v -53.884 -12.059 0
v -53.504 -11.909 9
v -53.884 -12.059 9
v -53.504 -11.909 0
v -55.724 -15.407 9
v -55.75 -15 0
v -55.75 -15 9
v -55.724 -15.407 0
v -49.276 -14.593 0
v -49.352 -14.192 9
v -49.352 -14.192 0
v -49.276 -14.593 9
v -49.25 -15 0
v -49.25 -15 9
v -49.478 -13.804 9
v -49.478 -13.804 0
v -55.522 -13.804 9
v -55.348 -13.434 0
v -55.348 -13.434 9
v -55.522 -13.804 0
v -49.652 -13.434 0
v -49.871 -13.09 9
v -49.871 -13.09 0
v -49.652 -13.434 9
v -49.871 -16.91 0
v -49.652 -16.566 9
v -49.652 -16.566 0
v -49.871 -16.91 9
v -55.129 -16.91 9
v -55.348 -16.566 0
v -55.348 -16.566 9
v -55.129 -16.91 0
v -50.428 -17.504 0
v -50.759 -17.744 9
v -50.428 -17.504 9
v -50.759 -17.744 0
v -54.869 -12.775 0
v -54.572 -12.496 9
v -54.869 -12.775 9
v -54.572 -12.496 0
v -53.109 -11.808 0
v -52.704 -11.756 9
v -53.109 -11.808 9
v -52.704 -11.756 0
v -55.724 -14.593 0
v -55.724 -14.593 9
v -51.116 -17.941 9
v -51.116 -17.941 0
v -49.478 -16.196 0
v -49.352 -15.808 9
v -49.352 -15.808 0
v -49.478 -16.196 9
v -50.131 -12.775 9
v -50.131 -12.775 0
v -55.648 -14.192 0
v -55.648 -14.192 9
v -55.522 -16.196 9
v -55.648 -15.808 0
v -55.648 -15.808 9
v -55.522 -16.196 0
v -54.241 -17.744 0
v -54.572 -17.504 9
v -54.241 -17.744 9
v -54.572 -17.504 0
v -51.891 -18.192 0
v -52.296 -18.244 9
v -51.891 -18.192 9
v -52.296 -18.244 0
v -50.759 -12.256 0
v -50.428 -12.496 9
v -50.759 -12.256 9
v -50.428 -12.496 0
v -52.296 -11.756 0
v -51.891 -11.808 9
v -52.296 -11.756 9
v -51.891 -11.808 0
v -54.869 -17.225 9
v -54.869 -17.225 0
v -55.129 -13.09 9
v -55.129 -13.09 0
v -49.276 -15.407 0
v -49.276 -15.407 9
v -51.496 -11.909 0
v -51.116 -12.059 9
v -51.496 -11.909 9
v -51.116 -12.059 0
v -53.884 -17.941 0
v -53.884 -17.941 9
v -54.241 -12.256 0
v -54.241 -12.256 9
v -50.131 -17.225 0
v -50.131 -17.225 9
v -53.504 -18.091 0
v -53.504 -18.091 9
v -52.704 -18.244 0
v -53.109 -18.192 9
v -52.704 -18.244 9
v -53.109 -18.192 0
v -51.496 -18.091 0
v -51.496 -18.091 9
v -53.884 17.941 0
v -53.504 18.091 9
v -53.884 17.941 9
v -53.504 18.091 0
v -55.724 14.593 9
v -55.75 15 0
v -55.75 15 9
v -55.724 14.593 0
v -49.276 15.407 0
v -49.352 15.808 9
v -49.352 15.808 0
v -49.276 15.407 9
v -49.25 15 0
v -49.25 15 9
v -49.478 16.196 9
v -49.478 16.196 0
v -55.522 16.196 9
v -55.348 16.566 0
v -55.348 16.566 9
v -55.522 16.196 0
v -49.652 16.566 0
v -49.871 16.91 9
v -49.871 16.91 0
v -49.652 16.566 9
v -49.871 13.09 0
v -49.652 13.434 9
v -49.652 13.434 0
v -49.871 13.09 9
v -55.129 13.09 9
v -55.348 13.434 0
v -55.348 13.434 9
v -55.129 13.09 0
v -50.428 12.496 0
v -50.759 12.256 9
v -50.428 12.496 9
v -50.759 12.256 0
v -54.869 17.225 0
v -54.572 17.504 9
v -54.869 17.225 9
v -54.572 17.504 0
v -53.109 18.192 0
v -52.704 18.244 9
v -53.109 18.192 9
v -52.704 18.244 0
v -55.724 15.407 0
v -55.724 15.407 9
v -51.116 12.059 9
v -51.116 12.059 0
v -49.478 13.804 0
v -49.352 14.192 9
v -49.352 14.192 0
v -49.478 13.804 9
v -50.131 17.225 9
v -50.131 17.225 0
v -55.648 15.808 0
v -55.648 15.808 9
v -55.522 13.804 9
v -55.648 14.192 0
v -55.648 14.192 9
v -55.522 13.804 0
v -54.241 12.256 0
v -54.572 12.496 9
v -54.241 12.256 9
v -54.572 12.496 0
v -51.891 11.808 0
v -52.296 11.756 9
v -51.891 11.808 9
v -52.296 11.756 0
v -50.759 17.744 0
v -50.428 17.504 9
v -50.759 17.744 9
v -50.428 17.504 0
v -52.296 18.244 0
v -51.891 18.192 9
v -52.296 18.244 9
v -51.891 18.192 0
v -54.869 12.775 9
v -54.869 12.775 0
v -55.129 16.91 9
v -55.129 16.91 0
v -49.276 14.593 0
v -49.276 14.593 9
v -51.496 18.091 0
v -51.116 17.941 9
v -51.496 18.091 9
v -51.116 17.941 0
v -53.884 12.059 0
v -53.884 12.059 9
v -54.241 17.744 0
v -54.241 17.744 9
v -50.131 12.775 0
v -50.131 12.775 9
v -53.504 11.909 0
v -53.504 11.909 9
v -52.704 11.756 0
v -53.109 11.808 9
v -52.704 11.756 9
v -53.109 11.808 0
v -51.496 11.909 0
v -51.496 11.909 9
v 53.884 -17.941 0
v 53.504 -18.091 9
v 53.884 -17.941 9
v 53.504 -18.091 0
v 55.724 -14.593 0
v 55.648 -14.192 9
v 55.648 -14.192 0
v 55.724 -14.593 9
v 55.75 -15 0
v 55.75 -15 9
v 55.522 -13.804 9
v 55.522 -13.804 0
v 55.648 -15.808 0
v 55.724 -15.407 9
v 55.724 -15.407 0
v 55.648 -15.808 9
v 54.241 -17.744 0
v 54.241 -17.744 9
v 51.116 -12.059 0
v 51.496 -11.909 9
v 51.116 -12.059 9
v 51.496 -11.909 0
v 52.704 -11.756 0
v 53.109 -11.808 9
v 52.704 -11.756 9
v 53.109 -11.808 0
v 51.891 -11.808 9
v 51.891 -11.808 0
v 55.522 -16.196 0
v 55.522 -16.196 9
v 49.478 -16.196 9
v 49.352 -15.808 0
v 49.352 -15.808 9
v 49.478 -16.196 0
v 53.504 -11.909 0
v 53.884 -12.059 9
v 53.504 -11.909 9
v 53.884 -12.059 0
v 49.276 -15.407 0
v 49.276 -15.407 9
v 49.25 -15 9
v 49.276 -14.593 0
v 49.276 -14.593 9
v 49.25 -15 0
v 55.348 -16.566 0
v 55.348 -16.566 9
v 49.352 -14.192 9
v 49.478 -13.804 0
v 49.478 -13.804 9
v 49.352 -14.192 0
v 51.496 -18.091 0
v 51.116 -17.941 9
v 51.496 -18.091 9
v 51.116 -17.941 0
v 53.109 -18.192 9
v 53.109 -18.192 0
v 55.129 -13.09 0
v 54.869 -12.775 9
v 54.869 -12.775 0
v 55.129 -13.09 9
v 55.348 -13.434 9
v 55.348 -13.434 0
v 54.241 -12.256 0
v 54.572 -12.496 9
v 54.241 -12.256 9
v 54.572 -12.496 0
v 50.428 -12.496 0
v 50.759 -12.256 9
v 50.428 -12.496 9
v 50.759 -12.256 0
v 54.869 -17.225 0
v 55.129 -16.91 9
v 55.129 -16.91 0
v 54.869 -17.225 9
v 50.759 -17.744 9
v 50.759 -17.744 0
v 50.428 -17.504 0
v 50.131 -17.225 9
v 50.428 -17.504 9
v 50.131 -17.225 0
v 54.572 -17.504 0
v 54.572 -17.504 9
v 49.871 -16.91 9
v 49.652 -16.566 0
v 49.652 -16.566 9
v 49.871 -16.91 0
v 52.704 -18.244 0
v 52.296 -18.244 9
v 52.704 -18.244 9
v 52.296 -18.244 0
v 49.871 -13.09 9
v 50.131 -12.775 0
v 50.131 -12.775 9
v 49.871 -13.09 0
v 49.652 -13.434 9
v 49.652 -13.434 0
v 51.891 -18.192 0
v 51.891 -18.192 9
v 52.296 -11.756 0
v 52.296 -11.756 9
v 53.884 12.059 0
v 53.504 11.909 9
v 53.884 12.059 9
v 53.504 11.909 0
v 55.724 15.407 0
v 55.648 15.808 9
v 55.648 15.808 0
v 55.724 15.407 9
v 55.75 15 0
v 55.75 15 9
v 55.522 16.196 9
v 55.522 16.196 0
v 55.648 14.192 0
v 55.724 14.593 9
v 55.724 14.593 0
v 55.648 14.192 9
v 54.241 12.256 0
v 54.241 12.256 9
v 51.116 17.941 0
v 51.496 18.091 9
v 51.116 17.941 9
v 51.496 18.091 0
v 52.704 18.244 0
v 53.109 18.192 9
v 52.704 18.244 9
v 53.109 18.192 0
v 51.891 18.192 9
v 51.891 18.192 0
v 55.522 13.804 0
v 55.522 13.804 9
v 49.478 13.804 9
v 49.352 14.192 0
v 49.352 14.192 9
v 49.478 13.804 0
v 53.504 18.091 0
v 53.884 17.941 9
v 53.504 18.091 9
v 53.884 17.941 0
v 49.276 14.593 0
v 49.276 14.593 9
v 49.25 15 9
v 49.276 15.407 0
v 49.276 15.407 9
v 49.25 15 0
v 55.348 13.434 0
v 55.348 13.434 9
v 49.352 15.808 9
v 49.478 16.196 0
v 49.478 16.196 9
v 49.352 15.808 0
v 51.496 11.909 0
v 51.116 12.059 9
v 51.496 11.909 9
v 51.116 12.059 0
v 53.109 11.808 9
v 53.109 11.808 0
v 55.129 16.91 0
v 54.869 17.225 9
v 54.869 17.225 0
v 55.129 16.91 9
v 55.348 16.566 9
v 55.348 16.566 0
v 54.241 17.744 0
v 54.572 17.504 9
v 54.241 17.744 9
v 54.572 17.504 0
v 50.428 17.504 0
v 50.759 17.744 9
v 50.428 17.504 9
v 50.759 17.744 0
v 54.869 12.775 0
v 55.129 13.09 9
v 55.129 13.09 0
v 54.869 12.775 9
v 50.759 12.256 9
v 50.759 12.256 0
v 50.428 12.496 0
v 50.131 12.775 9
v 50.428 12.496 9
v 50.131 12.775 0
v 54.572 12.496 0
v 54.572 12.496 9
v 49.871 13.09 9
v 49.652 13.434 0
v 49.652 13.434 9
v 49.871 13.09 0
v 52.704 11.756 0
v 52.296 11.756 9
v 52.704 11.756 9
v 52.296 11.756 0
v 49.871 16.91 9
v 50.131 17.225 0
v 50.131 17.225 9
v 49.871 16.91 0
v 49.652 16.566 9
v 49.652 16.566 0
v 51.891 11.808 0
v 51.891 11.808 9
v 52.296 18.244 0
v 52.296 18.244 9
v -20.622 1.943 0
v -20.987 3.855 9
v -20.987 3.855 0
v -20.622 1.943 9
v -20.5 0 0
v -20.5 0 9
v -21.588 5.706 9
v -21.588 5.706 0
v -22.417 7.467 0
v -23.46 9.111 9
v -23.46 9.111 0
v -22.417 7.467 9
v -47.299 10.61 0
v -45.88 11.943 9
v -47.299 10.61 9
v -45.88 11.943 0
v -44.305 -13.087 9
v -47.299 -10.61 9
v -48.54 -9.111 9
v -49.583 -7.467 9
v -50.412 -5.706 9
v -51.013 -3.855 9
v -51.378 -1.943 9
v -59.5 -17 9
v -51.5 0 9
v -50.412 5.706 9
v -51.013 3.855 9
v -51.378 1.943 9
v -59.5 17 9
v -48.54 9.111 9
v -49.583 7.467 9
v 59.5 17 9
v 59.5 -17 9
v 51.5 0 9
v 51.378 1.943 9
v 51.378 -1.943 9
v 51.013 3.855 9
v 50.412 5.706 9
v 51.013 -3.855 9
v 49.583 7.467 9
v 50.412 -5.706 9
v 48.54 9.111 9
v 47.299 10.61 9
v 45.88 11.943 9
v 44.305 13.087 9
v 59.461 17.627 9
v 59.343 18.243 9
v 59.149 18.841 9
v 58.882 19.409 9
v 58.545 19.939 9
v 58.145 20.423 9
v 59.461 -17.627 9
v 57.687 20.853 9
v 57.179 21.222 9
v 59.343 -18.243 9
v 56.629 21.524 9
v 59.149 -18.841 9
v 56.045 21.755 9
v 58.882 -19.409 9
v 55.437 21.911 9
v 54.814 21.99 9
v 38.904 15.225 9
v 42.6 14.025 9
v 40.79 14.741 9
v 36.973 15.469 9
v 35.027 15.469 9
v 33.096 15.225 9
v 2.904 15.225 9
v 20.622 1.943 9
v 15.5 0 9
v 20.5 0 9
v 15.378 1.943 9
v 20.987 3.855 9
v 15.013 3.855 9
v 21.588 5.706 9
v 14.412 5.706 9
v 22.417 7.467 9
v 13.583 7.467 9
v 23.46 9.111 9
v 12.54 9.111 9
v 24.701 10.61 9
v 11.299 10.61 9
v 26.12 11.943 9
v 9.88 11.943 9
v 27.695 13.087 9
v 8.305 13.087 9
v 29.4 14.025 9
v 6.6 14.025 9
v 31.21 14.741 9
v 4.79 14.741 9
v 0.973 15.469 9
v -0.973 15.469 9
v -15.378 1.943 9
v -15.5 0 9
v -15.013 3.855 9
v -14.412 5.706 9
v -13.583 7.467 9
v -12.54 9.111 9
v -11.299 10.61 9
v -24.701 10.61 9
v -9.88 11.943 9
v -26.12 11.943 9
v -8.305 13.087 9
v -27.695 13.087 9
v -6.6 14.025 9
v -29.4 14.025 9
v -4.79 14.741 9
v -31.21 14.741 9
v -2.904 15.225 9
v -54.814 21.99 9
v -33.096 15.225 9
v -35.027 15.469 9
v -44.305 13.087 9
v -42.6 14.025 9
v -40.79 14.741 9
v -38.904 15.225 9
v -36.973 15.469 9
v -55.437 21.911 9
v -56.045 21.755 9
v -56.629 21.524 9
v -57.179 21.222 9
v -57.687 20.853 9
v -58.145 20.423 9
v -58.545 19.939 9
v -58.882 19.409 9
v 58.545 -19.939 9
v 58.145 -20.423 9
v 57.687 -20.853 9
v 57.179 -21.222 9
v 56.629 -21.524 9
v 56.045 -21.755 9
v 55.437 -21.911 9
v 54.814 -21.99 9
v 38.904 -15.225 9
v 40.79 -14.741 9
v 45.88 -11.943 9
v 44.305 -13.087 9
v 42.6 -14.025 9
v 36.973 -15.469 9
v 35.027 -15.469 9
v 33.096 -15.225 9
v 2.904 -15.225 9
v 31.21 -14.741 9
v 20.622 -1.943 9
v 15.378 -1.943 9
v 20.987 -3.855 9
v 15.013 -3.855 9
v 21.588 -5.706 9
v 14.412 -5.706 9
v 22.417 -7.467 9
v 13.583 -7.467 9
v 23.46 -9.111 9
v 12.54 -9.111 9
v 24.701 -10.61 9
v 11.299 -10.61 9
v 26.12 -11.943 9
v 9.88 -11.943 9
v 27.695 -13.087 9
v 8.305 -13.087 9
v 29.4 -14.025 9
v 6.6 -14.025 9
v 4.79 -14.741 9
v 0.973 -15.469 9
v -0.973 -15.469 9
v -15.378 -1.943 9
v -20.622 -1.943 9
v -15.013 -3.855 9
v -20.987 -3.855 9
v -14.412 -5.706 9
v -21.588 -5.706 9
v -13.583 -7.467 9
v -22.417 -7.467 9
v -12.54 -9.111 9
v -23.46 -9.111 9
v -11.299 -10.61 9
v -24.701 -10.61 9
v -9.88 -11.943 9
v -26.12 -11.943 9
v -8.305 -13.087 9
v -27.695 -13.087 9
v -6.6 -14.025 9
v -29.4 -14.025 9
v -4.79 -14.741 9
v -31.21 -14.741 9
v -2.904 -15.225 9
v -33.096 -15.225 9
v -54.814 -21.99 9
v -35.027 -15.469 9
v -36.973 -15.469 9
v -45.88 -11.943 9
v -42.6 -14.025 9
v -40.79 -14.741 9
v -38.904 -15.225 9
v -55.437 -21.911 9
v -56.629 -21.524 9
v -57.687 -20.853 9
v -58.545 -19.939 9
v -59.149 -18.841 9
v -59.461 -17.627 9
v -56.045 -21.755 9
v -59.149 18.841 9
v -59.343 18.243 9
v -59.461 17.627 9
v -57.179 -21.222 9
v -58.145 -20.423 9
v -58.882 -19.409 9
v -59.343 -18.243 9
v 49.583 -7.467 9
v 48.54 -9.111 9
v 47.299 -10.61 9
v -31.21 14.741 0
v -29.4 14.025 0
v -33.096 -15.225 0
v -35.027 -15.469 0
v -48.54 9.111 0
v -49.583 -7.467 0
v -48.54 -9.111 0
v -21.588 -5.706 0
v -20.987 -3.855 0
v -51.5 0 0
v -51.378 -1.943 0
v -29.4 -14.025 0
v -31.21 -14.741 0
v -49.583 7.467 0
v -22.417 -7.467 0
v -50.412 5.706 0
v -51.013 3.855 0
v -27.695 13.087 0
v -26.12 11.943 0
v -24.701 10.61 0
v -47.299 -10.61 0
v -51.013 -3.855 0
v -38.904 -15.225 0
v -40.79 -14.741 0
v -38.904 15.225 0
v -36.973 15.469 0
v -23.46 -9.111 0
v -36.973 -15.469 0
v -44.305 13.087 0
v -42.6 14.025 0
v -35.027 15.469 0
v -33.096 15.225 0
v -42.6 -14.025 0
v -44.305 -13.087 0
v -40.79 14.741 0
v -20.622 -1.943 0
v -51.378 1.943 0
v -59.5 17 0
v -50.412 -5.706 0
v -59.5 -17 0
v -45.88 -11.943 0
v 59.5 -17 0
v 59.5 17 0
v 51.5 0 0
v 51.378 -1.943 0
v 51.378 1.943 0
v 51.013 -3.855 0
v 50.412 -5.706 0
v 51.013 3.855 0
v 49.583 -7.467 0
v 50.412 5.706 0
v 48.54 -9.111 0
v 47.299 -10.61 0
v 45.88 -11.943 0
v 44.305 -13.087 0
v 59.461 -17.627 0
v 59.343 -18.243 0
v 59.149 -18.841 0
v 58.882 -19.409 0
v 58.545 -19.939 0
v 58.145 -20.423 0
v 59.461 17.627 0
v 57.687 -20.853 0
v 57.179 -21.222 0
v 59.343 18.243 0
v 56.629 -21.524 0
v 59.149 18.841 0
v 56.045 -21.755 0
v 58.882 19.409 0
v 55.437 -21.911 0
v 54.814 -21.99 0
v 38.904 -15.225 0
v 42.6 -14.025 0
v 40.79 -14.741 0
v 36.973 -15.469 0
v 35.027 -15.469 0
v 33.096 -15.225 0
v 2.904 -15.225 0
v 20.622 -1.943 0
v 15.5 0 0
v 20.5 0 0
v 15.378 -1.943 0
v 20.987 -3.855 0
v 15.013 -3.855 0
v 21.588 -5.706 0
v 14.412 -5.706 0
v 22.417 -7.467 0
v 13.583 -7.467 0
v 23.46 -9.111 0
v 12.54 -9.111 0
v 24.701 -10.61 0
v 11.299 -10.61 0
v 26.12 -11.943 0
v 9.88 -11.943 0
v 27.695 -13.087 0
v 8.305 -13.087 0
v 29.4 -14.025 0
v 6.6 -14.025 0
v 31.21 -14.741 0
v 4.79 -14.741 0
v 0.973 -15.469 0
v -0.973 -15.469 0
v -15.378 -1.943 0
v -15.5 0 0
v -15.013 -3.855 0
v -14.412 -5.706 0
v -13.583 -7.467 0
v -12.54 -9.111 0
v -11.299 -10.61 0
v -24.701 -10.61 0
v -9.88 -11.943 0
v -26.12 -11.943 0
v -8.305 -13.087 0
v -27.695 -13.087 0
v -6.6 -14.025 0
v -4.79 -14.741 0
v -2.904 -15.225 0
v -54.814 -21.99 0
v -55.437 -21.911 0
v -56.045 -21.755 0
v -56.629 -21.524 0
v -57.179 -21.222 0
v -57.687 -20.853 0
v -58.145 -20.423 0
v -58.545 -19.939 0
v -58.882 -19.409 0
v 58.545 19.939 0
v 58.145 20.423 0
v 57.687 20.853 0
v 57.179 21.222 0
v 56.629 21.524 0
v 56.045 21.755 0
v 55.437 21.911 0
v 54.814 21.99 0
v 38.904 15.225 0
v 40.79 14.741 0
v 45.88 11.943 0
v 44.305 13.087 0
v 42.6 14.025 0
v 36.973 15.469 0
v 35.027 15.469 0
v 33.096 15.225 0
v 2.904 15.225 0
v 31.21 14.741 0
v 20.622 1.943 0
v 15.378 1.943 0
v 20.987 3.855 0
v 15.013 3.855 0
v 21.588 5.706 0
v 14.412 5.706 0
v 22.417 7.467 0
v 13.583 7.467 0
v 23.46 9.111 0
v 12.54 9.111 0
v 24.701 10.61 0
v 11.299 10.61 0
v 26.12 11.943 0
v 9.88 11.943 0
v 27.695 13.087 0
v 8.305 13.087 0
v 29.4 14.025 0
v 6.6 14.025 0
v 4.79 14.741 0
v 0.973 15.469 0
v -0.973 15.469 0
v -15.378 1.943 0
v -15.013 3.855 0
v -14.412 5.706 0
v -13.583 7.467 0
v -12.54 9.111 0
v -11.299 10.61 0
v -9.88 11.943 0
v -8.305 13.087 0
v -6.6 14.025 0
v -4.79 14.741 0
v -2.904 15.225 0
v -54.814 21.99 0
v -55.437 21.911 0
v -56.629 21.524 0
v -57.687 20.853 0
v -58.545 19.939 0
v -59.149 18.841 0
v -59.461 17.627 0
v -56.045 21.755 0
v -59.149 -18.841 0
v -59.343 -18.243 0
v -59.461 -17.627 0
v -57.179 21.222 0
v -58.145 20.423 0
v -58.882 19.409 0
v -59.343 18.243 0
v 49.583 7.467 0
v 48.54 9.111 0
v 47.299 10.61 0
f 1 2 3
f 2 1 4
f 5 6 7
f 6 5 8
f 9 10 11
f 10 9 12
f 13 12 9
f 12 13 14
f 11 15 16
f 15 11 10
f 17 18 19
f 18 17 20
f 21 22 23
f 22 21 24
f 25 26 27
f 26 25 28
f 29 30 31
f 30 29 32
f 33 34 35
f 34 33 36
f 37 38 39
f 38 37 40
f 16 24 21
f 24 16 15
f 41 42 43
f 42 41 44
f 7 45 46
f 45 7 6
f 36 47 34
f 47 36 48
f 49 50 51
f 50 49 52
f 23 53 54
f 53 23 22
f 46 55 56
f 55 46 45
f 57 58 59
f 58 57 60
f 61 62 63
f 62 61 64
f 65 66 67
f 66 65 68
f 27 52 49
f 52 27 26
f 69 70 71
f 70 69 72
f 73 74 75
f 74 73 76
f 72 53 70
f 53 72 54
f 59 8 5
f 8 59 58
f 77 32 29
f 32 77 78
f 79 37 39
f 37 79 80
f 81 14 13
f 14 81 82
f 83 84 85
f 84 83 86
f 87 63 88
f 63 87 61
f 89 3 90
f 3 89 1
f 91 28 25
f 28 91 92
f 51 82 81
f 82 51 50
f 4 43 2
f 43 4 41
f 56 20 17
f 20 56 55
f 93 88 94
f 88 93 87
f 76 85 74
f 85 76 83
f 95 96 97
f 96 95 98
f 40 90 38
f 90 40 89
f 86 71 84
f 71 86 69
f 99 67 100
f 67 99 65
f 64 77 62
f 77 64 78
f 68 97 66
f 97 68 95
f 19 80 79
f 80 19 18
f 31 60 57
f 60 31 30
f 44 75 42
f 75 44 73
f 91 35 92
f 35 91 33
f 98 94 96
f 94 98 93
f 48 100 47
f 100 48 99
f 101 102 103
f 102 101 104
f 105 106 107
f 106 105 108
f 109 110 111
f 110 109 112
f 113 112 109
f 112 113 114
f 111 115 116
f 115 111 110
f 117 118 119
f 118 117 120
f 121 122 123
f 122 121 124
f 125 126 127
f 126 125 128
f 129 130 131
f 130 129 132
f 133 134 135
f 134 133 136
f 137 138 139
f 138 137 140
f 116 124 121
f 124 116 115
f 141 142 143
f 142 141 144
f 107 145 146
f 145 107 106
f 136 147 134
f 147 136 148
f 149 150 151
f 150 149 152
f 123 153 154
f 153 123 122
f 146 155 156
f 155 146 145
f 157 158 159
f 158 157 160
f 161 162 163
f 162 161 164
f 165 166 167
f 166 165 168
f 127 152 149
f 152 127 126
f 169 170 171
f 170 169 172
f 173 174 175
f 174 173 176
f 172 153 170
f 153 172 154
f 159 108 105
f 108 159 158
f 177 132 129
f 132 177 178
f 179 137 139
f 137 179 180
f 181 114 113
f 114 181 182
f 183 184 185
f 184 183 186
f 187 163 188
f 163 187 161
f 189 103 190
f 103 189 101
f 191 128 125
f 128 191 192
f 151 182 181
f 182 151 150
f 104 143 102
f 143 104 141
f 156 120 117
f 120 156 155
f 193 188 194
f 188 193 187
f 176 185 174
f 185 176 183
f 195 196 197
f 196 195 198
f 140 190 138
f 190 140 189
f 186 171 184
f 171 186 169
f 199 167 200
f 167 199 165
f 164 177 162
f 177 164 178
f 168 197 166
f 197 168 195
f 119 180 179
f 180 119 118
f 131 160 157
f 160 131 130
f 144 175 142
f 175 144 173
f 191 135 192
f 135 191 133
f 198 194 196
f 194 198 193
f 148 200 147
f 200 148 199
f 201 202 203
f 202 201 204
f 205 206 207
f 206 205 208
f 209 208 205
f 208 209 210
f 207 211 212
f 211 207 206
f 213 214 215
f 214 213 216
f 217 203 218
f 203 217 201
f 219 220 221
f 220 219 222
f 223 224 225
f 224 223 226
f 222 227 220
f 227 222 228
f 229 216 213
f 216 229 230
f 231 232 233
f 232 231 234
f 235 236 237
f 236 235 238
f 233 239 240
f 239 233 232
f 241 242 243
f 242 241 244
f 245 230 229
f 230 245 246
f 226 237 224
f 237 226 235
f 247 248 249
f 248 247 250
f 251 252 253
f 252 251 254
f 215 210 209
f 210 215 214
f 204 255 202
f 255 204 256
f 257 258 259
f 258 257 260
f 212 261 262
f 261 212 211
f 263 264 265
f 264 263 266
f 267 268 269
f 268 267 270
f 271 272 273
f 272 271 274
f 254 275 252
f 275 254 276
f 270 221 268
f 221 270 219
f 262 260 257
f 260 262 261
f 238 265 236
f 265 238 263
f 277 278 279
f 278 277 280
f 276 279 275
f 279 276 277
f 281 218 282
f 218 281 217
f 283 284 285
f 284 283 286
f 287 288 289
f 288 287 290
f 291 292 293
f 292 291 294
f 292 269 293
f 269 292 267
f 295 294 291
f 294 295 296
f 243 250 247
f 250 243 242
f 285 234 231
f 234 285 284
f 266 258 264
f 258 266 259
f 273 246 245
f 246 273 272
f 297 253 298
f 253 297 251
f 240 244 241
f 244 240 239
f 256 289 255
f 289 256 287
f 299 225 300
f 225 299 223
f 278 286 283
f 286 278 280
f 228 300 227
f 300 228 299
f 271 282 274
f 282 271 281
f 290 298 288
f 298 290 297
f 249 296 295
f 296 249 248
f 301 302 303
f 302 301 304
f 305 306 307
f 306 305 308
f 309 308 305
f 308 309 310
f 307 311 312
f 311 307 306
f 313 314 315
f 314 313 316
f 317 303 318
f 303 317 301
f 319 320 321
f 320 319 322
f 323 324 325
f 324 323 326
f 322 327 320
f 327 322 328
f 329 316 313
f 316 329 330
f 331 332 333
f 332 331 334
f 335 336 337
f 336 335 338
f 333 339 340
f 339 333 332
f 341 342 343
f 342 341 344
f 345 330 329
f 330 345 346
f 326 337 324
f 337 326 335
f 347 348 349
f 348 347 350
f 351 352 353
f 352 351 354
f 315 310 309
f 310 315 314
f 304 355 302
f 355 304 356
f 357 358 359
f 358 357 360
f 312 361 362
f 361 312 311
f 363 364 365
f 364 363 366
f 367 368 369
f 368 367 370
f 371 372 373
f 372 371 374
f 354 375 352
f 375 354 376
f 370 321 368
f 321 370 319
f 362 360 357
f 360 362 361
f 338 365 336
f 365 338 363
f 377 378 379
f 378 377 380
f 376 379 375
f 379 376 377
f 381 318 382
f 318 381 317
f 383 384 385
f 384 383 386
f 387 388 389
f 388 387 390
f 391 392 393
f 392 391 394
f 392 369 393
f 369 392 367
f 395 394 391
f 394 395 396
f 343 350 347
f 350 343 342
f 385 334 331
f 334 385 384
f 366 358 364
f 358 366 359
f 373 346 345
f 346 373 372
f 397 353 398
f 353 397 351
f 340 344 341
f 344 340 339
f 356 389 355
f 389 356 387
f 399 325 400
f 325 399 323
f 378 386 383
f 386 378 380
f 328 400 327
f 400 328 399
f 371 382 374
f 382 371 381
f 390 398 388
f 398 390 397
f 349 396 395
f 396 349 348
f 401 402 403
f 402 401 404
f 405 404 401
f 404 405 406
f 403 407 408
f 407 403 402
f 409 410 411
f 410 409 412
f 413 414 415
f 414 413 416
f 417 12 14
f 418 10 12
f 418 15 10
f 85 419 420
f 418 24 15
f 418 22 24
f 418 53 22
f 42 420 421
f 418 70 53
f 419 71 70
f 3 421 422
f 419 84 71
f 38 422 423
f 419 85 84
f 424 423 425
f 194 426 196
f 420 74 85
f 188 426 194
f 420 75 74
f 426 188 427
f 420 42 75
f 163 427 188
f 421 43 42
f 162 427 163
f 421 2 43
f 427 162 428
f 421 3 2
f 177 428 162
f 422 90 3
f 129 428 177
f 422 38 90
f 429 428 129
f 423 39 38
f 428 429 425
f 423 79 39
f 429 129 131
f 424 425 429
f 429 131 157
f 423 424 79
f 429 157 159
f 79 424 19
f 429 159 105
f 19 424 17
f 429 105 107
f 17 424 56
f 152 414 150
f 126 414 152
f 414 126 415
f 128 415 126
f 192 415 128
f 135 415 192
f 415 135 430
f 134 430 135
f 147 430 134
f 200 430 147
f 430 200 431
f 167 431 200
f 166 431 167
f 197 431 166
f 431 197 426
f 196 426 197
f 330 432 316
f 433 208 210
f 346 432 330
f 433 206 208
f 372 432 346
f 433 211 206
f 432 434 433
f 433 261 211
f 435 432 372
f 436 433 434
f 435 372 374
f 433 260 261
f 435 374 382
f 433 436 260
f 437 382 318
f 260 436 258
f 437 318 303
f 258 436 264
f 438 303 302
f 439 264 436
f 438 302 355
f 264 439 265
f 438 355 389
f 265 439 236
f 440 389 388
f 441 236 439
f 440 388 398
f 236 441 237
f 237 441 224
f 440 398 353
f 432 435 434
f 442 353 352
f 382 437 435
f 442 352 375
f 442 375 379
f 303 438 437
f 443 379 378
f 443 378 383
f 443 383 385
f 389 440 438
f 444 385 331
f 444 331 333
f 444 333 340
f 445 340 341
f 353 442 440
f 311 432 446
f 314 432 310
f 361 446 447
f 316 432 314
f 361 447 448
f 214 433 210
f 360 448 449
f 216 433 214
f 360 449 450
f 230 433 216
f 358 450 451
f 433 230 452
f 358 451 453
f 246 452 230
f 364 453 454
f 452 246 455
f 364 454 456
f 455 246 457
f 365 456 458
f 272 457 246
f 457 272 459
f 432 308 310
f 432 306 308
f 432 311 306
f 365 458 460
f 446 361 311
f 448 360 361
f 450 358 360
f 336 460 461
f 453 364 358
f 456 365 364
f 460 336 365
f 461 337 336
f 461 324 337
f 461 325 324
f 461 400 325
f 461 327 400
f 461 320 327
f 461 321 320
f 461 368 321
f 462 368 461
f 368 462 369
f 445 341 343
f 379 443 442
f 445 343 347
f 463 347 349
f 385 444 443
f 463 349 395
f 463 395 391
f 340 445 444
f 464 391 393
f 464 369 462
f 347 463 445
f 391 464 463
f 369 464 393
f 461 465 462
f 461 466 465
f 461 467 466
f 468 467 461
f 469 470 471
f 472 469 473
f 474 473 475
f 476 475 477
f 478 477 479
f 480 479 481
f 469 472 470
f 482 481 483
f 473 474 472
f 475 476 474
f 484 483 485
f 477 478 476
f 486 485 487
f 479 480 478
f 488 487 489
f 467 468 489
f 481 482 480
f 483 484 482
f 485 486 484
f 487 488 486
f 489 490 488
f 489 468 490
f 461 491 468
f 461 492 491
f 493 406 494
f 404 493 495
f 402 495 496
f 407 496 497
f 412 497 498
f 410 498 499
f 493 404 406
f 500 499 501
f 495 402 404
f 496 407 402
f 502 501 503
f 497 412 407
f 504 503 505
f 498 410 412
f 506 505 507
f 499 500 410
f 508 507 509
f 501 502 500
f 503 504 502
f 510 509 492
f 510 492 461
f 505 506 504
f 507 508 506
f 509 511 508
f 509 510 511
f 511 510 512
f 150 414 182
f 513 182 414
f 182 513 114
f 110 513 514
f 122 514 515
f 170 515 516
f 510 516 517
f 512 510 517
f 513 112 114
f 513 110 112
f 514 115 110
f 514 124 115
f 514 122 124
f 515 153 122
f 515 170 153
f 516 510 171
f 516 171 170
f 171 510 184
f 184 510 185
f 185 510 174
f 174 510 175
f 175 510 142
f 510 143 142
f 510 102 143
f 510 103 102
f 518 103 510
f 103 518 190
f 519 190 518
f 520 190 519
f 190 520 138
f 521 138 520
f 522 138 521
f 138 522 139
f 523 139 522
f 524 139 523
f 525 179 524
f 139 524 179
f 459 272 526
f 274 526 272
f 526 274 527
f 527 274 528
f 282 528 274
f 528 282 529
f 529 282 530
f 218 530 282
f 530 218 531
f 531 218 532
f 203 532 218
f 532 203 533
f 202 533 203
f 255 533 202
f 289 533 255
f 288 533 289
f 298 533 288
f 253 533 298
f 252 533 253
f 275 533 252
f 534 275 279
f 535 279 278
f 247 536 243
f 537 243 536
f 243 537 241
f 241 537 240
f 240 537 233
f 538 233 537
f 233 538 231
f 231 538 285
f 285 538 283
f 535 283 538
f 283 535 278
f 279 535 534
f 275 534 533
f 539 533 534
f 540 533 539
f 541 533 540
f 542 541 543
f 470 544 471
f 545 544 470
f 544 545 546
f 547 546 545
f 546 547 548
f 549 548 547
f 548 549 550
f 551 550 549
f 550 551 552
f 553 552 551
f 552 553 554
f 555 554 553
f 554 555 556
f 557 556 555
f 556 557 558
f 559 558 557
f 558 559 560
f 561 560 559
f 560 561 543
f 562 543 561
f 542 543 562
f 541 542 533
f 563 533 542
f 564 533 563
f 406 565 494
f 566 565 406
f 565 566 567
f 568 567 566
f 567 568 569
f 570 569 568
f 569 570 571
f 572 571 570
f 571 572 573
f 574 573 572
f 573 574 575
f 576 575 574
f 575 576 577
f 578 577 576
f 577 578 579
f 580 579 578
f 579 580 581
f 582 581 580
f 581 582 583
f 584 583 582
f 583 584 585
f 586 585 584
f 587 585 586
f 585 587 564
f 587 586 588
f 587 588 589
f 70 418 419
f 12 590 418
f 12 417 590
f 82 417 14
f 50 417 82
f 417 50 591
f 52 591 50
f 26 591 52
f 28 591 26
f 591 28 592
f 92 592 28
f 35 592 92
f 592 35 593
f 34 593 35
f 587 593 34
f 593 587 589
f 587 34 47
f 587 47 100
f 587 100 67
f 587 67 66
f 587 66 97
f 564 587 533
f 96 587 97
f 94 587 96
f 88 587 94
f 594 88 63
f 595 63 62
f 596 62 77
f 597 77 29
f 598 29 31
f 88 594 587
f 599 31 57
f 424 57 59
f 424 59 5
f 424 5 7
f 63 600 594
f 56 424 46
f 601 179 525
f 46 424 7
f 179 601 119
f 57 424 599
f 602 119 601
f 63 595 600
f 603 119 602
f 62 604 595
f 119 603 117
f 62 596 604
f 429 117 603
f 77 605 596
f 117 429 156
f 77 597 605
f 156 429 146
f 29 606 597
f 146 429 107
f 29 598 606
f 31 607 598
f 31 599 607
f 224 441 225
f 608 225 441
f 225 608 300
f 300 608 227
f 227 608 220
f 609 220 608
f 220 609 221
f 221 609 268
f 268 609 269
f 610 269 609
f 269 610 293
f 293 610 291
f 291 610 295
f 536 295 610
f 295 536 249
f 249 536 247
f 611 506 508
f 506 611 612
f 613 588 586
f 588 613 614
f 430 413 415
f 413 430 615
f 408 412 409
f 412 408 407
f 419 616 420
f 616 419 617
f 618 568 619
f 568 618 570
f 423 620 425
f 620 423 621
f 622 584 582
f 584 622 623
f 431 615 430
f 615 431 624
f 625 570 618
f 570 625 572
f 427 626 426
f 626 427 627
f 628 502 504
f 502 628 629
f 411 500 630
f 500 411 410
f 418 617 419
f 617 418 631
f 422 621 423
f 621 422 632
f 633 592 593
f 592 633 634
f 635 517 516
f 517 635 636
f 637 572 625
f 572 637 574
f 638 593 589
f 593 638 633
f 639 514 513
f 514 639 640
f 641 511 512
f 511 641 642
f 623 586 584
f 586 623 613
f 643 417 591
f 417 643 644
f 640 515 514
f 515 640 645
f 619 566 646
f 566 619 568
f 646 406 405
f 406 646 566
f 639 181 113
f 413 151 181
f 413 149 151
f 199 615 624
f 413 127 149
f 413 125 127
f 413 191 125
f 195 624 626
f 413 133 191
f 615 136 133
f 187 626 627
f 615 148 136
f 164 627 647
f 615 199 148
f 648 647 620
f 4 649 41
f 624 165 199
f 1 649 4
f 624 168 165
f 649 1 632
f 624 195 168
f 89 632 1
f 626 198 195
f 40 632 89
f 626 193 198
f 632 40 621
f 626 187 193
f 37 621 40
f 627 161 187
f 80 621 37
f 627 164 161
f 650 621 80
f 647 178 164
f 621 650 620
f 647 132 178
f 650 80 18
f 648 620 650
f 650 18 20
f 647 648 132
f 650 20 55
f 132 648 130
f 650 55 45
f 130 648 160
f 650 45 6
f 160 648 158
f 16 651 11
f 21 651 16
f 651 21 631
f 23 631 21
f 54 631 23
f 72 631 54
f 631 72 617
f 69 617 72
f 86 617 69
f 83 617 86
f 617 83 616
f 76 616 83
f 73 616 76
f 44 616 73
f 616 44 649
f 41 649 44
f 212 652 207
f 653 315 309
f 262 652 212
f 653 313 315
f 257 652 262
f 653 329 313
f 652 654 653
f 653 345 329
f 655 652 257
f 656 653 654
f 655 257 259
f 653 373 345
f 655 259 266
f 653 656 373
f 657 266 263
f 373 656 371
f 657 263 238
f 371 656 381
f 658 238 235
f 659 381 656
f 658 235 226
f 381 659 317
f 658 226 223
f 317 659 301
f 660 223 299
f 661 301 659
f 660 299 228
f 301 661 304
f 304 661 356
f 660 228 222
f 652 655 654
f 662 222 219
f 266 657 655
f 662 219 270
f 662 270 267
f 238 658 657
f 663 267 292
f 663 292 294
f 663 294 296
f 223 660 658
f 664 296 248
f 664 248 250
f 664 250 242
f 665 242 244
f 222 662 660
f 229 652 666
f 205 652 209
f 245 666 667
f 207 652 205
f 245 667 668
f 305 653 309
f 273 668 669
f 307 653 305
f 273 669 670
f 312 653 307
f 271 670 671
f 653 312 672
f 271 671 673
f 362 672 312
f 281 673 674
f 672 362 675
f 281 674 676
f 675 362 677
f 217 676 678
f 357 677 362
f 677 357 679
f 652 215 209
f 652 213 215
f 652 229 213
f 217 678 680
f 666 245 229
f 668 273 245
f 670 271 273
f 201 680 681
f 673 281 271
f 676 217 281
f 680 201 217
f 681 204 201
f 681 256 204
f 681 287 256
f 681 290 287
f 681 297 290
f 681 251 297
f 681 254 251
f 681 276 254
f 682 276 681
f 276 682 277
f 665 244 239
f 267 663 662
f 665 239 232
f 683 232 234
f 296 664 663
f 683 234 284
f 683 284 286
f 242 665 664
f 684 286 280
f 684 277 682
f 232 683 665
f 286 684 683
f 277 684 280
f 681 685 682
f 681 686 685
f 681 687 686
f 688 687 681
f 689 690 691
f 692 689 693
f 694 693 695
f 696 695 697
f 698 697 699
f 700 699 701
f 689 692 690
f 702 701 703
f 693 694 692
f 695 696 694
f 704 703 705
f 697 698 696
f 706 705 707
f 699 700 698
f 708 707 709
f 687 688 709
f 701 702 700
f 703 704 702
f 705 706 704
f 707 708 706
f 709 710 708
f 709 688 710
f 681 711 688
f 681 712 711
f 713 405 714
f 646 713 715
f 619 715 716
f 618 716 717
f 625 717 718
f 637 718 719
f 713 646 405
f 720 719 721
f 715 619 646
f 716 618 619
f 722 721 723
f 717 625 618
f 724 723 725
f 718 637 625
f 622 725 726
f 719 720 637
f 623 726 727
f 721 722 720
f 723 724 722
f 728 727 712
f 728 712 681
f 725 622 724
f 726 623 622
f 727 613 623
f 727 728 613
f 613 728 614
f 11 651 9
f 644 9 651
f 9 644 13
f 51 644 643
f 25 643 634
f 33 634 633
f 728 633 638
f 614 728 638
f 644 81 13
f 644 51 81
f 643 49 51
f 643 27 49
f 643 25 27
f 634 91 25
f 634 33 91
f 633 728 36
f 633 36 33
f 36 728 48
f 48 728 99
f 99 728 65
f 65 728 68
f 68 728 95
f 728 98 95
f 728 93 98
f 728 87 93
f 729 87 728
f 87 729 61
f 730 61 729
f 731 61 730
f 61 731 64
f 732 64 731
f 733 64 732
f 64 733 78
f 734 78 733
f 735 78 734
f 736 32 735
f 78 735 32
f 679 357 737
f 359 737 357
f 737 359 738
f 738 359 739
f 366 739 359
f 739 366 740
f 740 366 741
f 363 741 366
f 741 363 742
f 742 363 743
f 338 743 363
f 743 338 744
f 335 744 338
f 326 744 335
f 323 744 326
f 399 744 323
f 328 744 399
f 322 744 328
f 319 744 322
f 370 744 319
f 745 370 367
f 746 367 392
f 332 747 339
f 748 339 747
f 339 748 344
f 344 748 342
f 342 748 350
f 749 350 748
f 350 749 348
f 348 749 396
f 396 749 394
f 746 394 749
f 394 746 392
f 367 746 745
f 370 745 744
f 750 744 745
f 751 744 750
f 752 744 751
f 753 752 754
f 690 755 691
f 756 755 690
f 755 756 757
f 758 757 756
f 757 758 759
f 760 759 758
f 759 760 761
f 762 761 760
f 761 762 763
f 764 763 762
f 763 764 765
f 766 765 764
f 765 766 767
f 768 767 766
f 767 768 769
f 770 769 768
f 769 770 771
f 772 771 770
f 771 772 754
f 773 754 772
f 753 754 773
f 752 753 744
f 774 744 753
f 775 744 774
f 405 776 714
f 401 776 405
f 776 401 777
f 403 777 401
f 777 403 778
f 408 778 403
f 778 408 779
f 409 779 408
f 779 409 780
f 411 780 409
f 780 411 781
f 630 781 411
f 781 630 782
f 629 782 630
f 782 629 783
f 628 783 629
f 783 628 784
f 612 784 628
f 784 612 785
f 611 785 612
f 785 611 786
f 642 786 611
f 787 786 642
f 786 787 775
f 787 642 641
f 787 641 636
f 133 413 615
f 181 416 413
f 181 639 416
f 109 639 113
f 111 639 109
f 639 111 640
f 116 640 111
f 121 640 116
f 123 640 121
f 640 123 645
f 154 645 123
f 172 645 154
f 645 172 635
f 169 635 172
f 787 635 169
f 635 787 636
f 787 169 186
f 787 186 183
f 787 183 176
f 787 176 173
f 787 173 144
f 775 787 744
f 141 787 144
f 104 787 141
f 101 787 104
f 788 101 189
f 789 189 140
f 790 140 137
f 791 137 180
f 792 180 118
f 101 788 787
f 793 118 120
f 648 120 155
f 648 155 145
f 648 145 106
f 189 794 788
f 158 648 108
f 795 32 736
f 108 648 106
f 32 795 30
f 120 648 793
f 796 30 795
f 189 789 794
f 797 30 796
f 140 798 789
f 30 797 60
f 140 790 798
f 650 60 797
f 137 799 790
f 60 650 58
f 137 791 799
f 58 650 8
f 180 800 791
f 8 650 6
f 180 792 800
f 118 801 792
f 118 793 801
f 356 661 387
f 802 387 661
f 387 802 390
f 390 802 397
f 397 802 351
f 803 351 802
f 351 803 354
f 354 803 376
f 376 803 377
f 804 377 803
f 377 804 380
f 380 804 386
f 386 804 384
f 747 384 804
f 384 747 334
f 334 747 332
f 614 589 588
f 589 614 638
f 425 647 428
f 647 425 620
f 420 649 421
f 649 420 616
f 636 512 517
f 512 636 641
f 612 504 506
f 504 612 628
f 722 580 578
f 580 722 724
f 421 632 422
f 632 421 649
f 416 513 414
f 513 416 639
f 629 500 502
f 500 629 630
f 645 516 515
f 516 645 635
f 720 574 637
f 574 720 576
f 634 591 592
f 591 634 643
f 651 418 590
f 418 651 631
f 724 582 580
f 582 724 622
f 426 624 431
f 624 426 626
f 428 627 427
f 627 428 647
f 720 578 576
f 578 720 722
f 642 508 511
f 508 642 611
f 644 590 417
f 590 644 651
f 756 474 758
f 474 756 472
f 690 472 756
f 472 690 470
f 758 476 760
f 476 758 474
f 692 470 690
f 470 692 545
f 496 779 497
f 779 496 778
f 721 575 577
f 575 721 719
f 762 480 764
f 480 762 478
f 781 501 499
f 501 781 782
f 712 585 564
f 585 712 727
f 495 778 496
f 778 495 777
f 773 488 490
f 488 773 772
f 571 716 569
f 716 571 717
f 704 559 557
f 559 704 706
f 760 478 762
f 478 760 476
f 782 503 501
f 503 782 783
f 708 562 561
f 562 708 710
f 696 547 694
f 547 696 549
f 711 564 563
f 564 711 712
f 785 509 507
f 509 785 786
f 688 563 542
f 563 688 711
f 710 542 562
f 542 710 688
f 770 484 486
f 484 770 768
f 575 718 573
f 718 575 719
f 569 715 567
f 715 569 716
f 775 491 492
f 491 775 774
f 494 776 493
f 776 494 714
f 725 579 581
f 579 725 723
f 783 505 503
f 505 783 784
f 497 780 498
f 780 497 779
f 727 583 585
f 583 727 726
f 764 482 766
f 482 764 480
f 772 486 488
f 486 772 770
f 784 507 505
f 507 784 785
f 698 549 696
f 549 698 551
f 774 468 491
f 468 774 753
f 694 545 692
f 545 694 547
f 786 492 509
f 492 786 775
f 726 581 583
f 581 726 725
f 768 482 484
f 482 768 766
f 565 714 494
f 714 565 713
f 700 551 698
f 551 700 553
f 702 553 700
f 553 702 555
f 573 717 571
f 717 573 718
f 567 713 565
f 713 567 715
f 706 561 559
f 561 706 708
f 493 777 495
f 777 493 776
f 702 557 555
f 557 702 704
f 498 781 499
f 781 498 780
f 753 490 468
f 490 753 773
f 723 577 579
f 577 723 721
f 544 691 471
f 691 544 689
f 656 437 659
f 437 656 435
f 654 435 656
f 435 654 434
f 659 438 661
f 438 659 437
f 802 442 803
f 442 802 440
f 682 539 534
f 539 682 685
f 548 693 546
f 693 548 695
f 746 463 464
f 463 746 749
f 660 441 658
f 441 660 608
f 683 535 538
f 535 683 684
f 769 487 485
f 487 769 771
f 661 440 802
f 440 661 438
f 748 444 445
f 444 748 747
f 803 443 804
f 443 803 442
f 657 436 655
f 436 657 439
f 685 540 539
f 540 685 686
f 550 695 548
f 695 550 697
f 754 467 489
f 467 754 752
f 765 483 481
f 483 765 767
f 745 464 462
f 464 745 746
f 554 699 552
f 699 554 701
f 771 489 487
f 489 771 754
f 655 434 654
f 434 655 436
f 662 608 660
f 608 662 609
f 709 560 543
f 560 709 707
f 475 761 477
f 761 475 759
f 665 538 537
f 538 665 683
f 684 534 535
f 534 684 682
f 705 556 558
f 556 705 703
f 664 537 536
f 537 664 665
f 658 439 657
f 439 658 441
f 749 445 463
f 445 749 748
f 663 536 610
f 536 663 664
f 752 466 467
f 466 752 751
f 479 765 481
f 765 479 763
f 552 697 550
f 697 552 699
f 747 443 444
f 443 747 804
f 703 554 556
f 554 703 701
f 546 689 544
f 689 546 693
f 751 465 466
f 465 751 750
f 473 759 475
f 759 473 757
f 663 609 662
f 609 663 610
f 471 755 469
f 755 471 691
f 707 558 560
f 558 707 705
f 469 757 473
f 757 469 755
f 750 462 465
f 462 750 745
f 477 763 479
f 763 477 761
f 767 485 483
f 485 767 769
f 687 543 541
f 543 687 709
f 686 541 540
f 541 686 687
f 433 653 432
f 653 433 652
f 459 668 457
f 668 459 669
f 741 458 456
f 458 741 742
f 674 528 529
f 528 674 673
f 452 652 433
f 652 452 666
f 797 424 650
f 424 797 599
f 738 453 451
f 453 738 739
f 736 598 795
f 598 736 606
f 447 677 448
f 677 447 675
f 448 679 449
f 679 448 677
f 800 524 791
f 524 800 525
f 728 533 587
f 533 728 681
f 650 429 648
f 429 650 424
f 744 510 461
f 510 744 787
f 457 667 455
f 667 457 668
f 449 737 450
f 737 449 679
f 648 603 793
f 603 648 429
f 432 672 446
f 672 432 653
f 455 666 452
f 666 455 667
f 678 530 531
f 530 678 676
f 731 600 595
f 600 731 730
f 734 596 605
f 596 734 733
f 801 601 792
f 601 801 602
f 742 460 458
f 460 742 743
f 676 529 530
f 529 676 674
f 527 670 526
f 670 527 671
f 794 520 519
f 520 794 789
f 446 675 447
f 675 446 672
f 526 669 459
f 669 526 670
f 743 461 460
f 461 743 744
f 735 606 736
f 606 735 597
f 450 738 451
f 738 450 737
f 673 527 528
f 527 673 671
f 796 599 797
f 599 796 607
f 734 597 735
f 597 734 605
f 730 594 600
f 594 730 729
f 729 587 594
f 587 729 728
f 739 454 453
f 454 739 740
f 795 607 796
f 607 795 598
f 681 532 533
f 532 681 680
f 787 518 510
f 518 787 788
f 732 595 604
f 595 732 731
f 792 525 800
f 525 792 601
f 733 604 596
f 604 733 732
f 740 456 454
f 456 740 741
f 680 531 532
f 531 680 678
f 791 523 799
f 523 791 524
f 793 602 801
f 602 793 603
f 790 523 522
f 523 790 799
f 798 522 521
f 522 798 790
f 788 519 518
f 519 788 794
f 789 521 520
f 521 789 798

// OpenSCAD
$fn = 50;


difference() {
	union() {
		hull() {
			translate(v = [-54.5000000000, 17.0000000000, 0]) {
				cylinder(h = 9, r = 5);
			}
			translate(v = [54.5000000000, 17.0000000000, 0]) {
				cylinder(h = 9, r = 5);
			}
			translate(v = [-54.5000000000, -17.0000000000, 0]) {
				cylinder(h = 9, r = 5);
			}
			translate(v = [54.5000000000, -17.0000000000, 0]) {
				cylinder(h = 9, r = 5);
			}
		}
	}
	union() {
		#translate(v = [-52.5000000000, -15.0000000000, -100.0000000000]) {
			cylinder(h = 200, r = 3.2500000000);
		}
		#translate(v = [-52.5000000000, 15.0000000000, -100.0000000000]) {
			cylinder(h = 200, r = 3.2500000000);
		}
		#translate(v = [52.5000000000, -15.0000000000, -100.0000000000]) {
			cylinder(h = 200, r = 3.2500000000);
		}
		#translate(v = [52.5000000000, 15.0000000000, -100.0000000000]) {
			cylinder(h = 200, r = 3.2500000000);
		}
		#translate(v = [-36.0000000000, 0, 0]) {
			cylinder(h = 9, r = 15.5000000000);
		}
		#cylinder(h = 9, r = 15.5000000000);
		#translate(v = [36.0000000000, 0, 0]) {
			cylinder(h = 9, r = 15.5000000000);
		}
	}
}
